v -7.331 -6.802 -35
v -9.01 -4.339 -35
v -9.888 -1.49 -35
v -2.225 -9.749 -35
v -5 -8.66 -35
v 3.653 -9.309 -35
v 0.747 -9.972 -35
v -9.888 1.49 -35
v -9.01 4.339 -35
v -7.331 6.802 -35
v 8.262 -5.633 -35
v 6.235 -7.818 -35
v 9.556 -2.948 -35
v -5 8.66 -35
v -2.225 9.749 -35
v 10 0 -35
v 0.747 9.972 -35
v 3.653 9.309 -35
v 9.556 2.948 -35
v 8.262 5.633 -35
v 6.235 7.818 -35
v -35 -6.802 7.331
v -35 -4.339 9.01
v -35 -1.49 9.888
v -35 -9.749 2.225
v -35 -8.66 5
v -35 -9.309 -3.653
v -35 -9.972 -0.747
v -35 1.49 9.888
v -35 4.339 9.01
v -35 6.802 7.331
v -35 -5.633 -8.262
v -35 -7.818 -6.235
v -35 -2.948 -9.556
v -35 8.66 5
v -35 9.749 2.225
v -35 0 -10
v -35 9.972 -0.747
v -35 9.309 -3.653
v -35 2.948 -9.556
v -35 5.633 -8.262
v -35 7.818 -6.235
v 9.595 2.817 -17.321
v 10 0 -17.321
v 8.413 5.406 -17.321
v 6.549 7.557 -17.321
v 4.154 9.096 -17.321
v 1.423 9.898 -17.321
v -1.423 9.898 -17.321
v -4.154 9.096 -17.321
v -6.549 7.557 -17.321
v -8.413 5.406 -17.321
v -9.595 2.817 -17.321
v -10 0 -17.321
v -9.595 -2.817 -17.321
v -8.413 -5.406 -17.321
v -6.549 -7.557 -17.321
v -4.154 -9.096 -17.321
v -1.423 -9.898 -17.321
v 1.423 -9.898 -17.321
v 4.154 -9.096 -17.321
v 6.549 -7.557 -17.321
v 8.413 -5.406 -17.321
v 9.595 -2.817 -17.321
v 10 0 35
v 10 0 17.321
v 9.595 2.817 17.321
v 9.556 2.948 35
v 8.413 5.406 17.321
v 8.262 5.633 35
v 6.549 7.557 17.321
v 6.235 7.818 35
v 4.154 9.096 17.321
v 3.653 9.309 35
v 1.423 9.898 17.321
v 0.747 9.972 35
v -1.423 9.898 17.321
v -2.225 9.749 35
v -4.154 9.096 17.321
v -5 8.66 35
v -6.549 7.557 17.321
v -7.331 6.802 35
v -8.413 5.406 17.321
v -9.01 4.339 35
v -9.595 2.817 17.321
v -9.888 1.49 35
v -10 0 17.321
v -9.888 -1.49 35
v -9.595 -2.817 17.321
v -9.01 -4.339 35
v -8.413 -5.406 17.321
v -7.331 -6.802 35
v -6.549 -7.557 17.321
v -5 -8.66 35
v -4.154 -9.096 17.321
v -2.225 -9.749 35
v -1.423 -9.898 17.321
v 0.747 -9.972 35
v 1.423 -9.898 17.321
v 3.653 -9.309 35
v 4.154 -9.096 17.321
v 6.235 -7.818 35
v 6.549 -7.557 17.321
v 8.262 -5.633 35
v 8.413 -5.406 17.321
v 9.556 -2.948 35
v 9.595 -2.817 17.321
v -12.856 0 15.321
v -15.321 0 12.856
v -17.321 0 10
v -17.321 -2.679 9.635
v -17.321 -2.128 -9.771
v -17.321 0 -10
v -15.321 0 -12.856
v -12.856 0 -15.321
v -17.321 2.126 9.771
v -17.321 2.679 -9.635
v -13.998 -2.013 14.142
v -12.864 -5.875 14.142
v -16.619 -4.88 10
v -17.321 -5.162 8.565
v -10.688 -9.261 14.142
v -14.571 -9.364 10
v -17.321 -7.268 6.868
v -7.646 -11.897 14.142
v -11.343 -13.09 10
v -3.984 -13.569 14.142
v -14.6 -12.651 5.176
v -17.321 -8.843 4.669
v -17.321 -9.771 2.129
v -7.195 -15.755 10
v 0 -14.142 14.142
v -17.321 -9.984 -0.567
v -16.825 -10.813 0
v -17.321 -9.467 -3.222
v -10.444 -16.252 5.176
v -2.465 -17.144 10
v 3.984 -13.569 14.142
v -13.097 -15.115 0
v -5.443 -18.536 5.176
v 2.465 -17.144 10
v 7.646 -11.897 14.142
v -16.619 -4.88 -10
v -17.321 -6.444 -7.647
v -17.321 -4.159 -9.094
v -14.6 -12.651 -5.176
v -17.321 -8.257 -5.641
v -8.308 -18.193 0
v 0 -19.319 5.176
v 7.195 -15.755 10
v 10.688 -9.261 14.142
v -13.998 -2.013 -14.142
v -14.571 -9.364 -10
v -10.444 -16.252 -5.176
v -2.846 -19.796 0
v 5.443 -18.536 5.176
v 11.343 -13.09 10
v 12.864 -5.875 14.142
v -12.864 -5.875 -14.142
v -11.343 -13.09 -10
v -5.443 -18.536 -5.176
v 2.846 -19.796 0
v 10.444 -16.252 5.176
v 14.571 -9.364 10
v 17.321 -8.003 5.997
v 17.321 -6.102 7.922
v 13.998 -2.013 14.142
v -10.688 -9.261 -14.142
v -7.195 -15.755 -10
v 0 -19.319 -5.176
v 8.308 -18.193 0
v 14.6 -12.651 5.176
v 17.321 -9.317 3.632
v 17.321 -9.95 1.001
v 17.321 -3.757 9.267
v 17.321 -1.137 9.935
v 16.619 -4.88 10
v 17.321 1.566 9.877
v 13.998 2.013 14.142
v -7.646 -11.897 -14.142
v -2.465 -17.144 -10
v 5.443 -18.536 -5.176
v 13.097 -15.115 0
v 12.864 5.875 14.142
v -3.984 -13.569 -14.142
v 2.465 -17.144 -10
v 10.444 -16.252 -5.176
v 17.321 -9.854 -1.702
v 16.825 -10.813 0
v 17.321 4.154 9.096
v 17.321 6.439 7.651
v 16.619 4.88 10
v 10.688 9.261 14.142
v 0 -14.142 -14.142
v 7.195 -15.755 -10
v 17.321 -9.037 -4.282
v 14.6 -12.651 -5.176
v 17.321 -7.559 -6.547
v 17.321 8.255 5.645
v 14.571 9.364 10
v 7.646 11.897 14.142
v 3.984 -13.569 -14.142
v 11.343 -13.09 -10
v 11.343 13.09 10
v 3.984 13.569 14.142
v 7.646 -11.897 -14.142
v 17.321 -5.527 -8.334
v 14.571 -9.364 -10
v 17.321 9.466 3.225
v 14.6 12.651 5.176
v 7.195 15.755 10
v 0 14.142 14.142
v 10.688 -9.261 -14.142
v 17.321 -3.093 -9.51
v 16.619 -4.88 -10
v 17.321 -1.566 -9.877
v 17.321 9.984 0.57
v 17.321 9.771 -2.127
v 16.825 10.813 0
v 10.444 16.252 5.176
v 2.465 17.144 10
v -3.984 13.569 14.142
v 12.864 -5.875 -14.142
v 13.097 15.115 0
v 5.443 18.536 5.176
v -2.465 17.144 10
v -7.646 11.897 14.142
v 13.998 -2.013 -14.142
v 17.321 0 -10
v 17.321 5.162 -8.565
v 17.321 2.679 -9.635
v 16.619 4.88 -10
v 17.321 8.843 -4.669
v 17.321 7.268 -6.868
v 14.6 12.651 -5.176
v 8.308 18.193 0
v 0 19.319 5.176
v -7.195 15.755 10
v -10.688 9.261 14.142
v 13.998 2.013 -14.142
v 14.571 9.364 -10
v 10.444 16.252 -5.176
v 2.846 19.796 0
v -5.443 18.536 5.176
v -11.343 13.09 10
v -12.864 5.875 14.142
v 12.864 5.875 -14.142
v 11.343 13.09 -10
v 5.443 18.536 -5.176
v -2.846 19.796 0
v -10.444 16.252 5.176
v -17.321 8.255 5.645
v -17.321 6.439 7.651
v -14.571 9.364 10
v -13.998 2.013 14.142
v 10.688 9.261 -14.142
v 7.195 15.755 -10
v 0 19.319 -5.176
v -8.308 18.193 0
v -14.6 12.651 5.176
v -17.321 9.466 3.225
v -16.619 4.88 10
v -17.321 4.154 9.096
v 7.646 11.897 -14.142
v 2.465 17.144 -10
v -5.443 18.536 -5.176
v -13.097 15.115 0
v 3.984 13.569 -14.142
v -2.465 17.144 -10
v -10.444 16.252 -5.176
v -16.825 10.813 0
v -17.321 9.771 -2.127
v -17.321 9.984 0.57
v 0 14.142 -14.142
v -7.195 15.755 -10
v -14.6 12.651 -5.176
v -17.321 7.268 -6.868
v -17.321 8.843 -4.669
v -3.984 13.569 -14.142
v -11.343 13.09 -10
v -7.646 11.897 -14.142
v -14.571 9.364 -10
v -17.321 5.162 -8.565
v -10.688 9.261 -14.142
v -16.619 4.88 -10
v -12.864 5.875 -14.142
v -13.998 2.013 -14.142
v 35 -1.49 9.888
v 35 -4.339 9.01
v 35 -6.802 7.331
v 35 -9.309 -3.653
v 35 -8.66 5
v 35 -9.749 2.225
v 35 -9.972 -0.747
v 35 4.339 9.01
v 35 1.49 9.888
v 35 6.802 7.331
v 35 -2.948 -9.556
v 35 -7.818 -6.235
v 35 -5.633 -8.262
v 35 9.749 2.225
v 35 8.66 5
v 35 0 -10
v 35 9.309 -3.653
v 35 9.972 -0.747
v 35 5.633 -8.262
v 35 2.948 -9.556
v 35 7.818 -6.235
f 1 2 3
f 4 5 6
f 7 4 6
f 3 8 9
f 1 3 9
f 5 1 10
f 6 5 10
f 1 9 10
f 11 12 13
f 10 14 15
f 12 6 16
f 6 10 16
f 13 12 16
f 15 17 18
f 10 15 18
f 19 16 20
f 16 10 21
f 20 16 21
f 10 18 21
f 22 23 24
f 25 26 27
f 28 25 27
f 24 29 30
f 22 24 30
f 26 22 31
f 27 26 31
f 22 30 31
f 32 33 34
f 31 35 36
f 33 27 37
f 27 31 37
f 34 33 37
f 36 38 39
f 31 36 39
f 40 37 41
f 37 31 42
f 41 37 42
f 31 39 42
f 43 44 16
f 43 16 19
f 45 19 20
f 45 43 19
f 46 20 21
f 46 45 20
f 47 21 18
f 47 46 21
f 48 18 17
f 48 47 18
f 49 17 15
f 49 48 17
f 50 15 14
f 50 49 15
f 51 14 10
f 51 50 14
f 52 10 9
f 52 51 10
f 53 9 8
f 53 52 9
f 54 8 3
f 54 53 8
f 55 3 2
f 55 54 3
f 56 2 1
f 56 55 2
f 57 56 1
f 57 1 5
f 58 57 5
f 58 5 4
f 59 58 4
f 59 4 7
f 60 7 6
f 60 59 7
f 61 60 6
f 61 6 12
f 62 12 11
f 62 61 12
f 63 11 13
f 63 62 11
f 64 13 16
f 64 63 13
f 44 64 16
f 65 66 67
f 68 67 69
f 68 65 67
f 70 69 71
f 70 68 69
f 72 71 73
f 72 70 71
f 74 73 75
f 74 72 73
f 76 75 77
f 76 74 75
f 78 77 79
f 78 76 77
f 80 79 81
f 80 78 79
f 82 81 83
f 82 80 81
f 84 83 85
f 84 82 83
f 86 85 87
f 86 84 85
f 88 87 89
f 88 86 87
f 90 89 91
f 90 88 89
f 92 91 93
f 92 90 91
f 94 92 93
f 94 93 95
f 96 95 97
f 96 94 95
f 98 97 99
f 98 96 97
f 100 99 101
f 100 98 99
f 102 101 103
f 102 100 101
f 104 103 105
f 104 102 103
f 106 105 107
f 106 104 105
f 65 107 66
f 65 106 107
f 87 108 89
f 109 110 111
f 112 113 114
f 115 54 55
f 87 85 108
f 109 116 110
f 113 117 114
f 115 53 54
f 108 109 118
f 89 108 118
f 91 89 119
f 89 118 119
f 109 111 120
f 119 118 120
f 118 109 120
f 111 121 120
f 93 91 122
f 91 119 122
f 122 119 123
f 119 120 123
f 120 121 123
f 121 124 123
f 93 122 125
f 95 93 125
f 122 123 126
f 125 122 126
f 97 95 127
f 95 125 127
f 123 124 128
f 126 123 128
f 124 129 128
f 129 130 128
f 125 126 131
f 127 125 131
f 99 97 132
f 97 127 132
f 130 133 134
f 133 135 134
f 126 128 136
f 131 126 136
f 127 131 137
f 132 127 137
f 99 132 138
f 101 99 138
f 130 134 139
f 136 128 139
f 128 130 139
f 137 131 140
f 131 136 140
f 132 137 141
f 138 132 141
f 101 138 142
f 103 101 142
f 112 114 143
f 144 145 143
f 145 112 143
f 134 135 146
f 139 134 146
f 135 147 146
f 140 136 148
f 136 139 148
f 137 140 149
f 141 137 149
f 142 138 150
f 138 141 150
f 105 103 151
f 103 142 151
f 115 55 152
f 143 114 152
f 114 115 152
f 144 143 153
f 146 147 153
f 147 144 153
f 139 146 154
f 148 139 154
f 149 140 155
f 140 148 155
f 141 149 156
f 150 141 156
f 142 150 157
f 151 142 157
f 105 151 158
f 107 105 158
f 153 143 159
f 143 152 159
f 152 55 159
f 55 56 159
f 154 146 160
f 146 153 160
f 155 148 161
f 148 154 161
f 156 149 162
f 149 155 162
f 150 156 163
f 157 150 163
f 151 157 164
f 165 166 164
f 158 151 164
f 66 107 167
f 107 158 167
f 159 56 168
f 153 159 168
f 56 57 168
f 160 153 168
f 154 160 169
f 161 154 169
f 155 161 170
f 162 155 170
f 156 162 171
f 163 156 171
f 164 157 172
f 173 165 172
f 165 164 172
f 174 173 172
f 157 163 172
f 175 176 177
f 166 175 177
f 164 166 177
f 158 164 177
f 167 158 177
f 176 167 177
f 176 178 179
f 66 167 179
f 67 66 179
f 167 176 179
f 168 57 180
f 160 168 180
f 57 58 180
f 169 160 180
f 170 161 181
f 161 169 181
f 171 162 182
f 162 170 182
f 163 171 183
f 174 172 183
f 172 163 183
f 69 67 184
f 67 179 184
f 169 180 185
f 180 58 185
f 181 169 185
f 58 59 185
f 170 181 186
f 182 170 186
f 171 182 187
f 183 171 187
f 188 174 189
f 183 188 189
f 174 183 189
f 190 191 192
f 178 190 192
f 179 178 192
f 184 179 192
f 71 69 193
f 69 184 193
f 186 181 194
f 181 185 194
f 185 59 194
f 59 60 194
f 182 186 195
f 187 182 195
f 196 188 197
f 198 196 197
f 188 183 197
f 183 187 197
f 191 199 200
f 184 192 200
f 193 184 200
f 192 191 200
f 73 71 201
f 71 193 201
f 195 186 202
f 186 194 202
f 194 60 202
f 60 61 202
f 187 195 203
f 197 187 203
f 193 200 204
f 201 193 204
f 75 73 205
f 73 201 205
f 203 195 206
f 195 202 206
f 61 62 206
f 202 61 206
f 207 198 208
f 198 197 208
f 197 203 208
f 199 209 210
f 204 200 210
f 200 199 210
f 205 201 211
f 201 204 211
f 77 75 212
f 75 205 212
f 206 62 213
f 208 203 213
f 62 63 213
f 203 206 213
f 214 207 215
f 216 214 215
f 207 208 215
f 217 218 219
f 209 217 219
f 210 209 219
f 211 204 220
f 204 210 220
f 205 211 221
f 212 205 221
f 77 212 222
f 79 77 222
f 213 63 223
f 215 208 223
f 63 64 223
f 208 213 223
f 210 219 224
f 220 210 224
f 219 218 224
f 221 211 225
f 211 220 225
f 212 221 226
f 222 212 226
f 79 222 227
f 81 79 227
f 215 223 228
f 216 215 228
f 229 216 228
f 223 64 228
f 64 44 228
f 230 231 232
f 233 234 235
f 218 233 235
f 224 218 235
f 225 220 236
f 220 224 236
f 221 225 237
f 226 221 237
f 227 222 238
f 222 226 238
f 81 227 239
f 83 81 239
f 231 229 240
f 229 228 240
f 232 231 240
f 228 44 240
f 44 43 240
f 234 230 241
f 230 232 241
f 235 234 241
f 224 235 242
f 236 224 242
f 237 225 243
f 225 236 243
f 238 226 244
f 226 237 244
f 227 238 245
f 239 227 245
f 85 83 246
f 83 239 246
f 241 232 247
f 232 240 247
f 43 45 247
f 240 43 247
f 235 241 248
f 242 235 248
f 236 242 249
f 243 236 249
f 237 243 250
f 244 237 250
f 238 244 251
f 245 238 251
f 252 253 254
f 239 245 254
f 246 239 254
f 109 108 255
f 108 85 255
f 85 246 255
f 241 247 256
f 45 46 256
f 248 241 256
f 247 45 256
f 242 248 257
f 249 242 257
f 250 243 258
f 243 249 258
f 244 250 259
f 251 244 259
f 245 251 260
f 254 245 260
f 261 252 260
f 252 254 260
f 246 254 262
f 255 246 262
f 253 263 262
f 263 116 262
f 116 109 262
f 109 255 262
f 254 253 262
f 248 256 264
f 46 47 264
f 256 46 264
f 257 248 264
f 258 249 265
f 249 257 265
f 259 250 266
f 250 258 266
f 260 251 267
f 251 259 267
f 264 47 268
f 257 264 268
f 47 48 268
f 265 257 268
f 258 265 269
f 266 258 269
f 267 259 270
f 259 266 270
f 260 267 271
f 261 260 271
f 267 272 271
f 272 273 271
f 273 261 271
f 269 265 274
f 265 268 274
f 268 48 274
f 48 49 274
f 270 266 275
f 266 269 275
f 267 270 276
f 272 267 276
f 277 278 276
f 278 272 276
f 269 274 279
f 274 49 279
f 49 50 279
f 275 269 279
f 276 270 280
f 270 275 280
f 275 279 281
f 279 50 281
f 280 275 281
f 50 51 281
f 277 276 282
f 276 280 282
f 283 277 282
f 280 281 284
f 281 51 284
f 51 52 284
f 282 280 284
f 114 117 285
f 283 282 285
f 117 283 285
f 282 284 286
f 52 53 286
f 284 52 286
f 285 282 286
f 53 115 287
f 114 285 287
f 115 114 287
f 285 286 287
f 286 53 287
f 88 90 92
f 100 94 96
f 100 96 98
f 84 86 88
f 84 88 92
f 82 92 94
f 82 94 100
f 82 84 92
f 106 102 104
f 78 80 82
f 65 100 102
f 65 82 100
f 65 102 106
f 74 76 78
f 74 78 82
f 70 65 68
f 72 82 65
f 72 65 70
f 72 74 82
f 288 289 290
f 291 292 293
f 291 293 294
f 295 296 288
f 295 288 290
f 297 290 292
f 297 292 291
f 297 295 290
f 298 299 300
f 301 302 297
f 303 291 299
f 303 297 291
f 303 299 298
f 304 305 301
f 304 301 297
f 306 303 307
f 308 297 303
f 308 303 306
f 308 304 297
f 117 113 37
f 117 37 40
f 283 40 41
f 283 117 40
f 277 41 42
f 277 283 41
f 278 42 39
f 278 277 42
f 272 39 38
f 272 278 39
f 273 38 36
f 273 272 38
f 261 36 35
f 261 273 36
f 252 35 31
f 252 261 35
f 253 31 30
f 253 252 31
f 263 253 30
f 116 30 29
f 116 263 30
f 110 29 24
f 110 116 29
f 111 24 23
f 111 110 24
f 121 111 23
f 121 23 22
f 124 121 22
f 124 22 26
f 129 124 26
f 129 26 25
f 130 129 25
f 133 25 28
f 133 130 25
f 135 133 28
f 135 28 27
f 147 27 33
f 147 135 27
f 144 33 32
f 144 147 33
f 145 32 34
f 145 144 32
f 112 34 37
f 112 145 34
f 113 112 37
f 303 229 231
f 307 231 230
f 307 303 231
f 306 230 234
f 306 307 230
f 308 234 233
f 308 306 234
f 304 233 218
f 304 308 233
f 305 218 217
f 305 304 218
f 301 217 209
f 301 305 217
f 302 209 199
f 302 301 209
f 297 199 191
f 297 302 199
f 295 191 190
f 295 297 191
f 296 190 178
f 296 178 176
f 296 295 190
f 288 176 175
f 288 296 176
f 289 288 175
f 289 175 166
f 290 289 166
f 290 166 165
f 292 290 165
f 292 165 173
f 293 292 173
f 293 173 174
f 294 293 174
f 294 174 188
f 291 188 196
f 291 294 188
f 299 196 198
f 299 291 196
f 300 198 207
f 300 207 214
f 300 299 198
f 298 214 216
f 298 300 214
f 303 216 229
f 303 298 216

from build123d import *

# Parameters (mm, degrees)
SKETCH2_R           = 10
BOSS_EXTRUDE1_DEPTH = 35
SKETCH3_R           = 10
BOSS_EXTRUDE2_DEPTH = 35


with BuildPart() as part:
    # Sketch1 → Revolve1 (revolve)
    with BuildSketch(Plane(origin=(0, 0, 0), x_dir=(1, 0, 0), z_dir=(0, 1, 0))):
        with BuildLine():
            Line((0, 20), (0, -20))
            ThreePointArc((0, -20), (-20, 0), (0, 20))
        make_face()
    revolve(axis=Axis((0, 0, -20), (0, 0, 1)))



with BuildPart() as body_2:
    # Sketch2 → Boss-Extrude1 (new, symmetric)
    with BuildSketch(Plane.XY):
        Circle(SKETCH2_R)
    extrude(amount=BOSS_EXTRUDE1_DEPTH, both=True)


with BuildPart() as part_1:
    add(part.part)

    add(body_2.part)  # Boss-Extrude2 merges body 2
    # Sketch3 → Boss-Extrude2 (add, symmetric)
    with BuildSketch(Plane(origin=(0, 0, 0), x_dir=(0, 0, -1), z_dir=(1, 0, 0))):
        Circle(SKETCH3_R)
    extrude(amount=BOSS_EXTRUDE2_DEPTH, both=True)


solid = part_1.part
